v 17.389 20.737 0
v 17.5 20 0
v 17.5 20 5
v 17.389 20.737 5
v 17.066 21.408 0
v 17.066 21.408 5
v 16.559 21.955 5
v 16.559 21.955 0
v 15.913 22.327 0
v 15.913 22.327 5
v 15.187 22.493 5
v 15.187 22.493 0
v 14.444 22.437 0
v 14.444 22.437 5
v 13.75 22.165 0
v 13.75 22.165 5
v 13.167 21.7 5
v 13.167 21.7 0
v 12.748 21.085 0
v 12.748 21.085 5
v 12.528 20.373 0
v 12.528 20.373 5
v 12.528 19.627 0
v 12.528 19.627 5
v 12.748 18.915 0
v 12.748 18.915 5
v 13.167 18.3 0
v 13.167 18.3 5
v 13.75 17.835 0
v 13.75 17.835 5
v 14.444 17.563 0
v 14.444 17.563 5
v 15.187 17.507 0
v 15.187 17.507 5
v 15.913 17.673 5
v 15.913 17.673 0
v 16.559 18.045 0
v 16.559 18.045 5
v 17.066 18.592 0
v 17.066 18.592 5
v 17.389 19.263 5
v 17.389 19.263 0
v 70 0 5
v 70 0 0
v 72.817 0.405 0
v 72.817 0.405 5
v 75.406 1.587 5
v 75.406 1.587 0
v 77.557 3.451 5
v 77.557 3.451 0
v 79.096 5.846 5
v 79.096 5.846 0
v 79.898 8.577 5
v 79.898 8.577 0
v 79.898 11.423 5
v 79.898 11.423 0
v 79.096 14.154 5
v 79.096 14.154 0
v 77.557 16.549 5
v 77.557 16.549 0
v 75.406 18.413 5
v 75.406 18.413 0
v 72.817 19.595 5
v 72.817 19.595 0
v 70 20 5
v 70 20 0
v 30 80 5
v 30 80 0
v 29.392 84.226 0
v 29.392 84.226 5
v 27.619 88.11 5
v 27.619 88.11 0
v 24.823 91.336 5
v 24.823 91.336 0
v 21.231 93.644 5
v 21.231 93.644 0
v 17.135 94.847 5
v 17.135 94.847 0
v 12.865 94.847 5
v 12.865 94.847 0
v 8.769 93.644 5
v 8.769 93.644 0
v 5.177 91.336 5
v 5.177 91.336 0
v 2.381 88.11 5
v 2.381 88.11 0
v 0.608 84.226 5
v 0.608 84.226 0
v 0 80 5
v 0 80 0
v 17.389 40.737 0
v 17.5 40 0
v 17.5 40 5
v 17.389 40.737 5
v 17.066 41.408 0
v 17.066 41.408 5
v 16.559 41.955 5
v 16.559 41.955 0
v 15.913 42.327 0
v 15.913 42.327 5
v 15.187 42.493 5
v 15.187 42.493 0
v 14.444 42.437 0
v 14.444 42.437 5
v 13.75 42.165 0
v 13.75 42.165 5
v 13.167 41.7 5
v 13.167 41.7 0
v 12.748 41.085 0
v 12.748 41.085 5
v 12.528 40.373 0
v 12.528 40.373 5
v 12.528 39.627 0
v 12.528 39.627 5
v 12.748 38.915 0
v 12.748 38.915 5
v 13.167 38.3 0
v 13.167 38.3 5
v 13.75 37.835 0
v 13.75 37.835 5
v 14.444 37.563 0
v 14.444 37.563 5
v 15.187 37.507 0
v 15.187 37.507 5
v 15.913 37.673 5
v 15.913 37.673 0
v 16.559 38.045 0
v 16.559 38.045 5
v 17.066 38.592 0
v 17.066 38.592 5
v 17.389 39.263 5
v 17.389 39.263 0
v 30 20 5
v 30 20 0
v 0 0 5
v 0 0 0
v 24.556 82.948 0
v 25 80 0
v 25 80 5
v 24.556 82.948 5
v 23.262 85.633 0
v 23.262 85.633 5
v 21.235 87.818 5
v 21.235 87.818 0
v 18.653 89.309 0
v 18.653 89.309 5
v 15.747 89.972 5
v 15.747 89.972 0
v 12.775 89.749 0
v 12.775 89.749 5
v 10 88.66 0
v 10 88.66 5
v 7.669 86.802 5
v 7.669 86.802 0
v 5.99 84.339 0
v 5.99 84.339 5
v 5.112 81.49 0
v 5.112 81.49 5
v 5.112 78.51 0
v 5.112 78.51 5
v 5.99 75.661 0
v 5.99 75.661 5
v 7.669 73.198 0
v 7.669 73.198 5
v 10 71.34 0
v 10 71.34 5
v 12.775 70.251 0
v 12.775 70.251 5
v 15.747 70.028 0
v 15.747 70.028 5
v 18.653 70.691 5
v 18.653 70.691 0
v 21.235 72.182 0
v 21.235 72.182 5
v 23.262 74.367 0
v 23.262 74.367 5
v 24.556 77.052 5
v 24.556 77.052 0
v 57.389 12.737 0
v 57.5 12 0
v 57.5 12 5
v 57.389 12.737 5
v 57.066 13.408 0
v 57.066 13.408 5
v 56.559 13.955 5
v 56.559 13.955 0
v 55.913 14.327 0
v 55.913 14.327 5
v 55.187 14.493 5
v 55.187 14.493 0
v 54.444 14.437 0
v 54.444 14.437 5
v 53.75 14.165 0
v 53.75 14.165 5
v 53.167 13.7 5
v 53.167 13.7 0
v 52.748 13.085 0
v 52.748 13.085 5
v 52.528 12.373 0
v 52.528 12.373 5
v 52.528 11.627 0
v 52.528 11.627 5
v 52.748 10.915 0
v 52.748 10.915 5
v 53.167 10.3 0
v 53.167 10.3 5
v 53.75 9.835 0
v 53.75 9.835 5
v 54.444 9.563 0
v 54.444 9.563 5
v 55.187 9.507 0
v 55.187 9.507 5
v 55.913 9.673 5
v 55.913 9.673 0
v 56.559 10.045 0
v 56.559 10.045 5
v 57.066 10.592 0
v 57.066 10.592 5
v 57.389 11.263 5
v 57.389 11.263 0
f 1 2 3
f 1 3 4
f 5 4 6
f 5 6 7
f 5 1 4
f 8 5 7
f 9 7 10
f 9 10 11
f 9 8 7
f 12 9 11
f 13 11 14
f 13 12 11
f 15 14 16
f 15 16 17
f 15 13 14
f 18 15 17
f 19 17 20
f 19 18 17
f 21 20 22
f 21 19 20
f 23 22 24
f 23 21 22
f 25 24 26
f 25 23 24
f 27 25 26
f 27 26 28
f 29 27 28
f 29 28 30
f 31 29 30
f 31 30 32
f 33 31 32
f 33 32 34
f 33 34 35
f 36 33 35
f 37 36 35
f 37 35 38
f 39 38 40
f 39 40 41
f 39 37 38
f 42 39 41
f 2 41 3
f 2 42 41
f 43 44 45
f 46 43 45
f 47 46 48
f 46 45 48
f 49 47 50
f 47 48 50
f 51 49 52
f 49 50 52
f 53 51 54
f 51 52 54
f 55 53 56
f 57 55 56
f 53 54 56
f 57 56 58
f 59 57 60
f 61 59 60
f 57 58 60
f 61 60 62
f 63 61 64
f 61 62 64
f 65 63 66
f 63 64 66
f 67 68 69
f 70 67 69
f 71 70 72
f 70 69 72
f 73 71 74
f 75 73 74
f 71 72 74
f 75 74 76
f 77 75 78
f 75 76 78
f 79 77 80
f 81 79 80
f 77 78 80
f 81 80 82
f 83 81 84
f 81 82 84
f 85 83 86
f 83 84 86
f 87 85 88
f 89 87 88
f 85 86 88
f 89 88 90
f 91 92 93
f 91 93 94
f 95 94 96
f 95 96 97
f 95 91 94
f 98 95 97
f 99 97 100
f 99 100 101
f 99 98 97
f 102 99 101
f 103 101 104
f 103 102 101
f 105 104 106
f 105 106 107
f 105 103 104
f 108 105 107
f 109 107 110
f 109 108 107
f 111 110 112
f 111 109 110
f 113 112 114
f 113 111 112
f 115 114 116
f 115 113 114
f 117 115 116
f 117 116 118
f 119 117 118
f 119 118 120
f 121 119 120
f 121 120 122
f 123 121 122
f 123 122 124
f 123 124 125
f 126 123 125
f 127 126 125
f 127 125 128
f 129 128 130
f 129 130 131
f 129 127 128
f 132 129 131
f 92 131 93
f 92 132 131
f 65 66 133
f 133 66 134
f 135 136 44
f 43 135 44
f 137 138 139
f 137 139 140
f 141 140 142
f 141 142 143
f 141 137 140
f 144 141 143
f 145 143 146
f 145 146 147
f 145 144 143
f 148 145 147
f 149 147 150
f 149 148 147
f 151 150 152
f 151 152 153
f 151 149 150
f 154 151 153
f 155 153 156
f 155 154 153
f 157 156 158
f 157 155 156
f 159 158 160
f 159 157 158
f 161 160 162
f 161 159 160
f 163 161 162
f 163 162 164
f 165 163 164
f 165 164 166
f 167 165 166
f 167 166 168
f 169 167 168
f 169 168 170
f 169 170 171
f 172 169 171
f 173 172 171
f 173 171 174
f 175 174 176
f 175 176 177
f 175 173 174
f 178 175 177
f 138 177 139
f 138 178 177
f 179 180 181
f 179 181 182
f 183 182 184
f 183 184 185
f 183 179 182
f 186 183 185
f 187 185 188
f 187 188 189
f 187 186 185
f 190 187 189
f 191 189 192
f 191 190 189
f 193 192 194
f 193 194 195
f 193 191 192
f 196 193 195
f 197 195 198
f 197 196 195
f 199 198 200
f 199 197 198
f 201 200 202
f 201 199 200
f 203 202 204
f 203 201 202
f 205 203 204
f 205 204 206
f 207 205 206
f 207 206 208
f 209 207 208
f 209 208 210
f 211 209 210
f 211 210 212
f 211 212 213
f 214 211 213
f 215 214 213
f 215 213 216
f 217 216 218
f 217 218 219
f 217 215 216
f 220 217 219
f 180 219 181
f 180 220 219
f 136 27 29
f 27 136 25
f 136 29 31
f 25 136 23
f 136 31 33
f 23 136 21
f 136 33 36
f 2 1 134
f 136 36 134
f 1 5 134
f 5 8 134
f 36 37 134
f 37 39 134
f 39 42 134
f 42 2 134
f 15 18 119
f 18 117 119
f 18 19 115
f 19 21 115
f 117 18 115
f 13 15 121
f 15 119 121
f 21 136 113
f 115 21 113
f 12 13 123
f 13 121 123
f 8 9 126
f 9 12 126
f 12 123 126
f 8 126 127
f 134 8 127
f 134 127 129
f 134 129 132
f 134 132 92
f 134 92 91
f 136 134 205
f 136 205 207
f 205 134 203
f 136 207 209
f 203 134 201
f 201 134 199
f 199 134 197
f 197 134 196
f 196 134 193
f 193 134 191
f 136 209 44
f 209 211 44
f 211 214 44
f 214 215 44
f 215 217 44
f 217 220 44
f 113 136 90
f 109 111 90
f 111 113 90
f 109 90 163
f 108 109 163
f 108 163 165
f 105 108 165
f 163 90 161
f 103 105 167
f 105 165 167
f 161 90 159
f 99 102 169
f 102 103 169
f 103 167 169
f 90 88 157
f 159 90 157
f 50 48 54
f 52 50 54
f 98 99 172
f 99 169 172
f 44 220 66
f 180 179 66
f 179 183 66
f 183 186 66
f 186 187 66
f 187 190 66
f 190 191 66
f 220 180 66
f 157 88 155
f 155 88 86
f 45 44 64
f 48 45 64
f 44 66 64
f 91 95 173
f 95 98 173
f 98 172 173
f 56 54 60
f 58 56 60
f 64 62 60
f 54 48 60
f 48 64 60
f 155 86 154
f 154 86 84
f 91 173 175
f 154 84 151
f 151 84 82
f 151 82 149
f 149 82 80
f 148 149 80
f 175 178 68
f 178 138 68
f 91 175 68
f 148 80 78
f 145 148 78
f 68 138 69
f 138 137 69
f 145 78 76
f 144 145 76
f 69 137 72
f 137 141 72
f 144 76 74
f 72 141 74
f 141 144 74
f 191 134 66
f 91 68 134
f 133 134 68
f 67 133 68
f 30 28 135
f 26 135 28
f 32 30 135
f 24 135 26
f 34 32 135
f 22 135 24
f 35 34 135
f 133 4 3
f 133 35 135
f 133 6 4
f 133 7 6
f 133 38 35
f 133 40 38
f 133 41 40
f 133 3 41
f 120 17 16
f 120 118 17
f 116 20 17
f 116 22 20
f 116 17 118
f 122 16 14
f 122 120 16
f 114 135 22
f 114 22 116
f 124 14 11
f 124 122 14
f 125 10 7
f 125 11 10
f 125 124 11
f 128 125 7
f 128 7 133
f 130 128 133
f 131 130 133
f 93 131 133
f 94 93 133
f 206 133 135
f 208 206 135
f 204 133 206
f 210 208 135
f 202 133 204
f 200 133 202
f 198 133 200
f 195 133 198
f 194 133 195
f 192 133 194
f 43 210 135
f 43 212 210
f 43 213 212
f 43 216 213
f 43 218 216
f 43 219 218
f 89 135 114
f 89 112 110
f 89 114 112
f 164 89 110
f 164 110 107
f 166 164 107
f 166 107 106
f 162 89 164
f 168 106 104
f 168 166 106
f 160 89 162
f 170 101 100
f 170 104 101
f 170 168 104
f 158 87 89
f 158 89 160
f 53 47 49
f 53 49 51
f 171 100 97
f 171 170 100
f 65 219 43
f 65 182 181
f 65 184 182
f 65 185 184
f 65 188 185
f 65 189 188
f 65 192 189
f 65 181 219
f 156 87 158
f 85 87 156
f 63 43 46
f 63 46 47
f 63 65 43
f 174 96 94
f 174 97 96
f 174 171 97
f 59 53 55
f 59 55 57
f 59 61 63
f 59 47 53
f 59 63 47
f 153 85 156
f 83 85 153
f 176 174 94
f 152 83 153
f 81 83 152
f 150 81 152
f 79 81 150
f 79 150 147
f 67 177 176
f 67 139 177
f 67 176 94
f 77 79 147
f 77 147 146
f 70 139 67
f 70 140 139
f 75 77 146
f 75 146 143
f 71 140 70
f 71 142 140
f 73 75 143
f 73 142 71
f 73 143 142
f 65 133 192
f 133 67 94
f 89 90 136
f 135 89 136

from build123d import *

# Parameters (mm, degrees)
SKETCH2_R           = 10
SKETCH2_R_2         = 2.5
BOSS_EXTRUDE1_DEPTH = 5


with BuildPart() as part:
    # Sketch2 → Boss-Extrude1 (new body)
    with BuildSketch(Plane.XY):
        with BuildLine():
            Line((0, 0), (70, 0))
            ThreePointArc((70, 0), (80, 10), (70, 20))
            Line((70, 20), (30, 20))
            Line((30, 20), (30, 80))
            ThreePointArc((30, 80), (15, 95), (0, 80))
            Line((0, 80), (0, 0))
        make_face()
        with Locations((15, 80)):
            Circle(SKETCH2_R, mode=Mode.SUBTRACT)
        with Locations((15, 20)):
            Circle(SKETCH2_R_2, mode=Mode.SUBTRACT)
        with Locations((15, 40)):
            Circle(SKETCH2_R_2, mode=Mode.SUBTRACT)
        with Locations((55, 12)):
            Circle(SKETCH2_R_2, mode=Mode.SUBTRACT)
    extrude(amount=BOSS_EXTRUDE1_DEPTH)


solid = part.part
